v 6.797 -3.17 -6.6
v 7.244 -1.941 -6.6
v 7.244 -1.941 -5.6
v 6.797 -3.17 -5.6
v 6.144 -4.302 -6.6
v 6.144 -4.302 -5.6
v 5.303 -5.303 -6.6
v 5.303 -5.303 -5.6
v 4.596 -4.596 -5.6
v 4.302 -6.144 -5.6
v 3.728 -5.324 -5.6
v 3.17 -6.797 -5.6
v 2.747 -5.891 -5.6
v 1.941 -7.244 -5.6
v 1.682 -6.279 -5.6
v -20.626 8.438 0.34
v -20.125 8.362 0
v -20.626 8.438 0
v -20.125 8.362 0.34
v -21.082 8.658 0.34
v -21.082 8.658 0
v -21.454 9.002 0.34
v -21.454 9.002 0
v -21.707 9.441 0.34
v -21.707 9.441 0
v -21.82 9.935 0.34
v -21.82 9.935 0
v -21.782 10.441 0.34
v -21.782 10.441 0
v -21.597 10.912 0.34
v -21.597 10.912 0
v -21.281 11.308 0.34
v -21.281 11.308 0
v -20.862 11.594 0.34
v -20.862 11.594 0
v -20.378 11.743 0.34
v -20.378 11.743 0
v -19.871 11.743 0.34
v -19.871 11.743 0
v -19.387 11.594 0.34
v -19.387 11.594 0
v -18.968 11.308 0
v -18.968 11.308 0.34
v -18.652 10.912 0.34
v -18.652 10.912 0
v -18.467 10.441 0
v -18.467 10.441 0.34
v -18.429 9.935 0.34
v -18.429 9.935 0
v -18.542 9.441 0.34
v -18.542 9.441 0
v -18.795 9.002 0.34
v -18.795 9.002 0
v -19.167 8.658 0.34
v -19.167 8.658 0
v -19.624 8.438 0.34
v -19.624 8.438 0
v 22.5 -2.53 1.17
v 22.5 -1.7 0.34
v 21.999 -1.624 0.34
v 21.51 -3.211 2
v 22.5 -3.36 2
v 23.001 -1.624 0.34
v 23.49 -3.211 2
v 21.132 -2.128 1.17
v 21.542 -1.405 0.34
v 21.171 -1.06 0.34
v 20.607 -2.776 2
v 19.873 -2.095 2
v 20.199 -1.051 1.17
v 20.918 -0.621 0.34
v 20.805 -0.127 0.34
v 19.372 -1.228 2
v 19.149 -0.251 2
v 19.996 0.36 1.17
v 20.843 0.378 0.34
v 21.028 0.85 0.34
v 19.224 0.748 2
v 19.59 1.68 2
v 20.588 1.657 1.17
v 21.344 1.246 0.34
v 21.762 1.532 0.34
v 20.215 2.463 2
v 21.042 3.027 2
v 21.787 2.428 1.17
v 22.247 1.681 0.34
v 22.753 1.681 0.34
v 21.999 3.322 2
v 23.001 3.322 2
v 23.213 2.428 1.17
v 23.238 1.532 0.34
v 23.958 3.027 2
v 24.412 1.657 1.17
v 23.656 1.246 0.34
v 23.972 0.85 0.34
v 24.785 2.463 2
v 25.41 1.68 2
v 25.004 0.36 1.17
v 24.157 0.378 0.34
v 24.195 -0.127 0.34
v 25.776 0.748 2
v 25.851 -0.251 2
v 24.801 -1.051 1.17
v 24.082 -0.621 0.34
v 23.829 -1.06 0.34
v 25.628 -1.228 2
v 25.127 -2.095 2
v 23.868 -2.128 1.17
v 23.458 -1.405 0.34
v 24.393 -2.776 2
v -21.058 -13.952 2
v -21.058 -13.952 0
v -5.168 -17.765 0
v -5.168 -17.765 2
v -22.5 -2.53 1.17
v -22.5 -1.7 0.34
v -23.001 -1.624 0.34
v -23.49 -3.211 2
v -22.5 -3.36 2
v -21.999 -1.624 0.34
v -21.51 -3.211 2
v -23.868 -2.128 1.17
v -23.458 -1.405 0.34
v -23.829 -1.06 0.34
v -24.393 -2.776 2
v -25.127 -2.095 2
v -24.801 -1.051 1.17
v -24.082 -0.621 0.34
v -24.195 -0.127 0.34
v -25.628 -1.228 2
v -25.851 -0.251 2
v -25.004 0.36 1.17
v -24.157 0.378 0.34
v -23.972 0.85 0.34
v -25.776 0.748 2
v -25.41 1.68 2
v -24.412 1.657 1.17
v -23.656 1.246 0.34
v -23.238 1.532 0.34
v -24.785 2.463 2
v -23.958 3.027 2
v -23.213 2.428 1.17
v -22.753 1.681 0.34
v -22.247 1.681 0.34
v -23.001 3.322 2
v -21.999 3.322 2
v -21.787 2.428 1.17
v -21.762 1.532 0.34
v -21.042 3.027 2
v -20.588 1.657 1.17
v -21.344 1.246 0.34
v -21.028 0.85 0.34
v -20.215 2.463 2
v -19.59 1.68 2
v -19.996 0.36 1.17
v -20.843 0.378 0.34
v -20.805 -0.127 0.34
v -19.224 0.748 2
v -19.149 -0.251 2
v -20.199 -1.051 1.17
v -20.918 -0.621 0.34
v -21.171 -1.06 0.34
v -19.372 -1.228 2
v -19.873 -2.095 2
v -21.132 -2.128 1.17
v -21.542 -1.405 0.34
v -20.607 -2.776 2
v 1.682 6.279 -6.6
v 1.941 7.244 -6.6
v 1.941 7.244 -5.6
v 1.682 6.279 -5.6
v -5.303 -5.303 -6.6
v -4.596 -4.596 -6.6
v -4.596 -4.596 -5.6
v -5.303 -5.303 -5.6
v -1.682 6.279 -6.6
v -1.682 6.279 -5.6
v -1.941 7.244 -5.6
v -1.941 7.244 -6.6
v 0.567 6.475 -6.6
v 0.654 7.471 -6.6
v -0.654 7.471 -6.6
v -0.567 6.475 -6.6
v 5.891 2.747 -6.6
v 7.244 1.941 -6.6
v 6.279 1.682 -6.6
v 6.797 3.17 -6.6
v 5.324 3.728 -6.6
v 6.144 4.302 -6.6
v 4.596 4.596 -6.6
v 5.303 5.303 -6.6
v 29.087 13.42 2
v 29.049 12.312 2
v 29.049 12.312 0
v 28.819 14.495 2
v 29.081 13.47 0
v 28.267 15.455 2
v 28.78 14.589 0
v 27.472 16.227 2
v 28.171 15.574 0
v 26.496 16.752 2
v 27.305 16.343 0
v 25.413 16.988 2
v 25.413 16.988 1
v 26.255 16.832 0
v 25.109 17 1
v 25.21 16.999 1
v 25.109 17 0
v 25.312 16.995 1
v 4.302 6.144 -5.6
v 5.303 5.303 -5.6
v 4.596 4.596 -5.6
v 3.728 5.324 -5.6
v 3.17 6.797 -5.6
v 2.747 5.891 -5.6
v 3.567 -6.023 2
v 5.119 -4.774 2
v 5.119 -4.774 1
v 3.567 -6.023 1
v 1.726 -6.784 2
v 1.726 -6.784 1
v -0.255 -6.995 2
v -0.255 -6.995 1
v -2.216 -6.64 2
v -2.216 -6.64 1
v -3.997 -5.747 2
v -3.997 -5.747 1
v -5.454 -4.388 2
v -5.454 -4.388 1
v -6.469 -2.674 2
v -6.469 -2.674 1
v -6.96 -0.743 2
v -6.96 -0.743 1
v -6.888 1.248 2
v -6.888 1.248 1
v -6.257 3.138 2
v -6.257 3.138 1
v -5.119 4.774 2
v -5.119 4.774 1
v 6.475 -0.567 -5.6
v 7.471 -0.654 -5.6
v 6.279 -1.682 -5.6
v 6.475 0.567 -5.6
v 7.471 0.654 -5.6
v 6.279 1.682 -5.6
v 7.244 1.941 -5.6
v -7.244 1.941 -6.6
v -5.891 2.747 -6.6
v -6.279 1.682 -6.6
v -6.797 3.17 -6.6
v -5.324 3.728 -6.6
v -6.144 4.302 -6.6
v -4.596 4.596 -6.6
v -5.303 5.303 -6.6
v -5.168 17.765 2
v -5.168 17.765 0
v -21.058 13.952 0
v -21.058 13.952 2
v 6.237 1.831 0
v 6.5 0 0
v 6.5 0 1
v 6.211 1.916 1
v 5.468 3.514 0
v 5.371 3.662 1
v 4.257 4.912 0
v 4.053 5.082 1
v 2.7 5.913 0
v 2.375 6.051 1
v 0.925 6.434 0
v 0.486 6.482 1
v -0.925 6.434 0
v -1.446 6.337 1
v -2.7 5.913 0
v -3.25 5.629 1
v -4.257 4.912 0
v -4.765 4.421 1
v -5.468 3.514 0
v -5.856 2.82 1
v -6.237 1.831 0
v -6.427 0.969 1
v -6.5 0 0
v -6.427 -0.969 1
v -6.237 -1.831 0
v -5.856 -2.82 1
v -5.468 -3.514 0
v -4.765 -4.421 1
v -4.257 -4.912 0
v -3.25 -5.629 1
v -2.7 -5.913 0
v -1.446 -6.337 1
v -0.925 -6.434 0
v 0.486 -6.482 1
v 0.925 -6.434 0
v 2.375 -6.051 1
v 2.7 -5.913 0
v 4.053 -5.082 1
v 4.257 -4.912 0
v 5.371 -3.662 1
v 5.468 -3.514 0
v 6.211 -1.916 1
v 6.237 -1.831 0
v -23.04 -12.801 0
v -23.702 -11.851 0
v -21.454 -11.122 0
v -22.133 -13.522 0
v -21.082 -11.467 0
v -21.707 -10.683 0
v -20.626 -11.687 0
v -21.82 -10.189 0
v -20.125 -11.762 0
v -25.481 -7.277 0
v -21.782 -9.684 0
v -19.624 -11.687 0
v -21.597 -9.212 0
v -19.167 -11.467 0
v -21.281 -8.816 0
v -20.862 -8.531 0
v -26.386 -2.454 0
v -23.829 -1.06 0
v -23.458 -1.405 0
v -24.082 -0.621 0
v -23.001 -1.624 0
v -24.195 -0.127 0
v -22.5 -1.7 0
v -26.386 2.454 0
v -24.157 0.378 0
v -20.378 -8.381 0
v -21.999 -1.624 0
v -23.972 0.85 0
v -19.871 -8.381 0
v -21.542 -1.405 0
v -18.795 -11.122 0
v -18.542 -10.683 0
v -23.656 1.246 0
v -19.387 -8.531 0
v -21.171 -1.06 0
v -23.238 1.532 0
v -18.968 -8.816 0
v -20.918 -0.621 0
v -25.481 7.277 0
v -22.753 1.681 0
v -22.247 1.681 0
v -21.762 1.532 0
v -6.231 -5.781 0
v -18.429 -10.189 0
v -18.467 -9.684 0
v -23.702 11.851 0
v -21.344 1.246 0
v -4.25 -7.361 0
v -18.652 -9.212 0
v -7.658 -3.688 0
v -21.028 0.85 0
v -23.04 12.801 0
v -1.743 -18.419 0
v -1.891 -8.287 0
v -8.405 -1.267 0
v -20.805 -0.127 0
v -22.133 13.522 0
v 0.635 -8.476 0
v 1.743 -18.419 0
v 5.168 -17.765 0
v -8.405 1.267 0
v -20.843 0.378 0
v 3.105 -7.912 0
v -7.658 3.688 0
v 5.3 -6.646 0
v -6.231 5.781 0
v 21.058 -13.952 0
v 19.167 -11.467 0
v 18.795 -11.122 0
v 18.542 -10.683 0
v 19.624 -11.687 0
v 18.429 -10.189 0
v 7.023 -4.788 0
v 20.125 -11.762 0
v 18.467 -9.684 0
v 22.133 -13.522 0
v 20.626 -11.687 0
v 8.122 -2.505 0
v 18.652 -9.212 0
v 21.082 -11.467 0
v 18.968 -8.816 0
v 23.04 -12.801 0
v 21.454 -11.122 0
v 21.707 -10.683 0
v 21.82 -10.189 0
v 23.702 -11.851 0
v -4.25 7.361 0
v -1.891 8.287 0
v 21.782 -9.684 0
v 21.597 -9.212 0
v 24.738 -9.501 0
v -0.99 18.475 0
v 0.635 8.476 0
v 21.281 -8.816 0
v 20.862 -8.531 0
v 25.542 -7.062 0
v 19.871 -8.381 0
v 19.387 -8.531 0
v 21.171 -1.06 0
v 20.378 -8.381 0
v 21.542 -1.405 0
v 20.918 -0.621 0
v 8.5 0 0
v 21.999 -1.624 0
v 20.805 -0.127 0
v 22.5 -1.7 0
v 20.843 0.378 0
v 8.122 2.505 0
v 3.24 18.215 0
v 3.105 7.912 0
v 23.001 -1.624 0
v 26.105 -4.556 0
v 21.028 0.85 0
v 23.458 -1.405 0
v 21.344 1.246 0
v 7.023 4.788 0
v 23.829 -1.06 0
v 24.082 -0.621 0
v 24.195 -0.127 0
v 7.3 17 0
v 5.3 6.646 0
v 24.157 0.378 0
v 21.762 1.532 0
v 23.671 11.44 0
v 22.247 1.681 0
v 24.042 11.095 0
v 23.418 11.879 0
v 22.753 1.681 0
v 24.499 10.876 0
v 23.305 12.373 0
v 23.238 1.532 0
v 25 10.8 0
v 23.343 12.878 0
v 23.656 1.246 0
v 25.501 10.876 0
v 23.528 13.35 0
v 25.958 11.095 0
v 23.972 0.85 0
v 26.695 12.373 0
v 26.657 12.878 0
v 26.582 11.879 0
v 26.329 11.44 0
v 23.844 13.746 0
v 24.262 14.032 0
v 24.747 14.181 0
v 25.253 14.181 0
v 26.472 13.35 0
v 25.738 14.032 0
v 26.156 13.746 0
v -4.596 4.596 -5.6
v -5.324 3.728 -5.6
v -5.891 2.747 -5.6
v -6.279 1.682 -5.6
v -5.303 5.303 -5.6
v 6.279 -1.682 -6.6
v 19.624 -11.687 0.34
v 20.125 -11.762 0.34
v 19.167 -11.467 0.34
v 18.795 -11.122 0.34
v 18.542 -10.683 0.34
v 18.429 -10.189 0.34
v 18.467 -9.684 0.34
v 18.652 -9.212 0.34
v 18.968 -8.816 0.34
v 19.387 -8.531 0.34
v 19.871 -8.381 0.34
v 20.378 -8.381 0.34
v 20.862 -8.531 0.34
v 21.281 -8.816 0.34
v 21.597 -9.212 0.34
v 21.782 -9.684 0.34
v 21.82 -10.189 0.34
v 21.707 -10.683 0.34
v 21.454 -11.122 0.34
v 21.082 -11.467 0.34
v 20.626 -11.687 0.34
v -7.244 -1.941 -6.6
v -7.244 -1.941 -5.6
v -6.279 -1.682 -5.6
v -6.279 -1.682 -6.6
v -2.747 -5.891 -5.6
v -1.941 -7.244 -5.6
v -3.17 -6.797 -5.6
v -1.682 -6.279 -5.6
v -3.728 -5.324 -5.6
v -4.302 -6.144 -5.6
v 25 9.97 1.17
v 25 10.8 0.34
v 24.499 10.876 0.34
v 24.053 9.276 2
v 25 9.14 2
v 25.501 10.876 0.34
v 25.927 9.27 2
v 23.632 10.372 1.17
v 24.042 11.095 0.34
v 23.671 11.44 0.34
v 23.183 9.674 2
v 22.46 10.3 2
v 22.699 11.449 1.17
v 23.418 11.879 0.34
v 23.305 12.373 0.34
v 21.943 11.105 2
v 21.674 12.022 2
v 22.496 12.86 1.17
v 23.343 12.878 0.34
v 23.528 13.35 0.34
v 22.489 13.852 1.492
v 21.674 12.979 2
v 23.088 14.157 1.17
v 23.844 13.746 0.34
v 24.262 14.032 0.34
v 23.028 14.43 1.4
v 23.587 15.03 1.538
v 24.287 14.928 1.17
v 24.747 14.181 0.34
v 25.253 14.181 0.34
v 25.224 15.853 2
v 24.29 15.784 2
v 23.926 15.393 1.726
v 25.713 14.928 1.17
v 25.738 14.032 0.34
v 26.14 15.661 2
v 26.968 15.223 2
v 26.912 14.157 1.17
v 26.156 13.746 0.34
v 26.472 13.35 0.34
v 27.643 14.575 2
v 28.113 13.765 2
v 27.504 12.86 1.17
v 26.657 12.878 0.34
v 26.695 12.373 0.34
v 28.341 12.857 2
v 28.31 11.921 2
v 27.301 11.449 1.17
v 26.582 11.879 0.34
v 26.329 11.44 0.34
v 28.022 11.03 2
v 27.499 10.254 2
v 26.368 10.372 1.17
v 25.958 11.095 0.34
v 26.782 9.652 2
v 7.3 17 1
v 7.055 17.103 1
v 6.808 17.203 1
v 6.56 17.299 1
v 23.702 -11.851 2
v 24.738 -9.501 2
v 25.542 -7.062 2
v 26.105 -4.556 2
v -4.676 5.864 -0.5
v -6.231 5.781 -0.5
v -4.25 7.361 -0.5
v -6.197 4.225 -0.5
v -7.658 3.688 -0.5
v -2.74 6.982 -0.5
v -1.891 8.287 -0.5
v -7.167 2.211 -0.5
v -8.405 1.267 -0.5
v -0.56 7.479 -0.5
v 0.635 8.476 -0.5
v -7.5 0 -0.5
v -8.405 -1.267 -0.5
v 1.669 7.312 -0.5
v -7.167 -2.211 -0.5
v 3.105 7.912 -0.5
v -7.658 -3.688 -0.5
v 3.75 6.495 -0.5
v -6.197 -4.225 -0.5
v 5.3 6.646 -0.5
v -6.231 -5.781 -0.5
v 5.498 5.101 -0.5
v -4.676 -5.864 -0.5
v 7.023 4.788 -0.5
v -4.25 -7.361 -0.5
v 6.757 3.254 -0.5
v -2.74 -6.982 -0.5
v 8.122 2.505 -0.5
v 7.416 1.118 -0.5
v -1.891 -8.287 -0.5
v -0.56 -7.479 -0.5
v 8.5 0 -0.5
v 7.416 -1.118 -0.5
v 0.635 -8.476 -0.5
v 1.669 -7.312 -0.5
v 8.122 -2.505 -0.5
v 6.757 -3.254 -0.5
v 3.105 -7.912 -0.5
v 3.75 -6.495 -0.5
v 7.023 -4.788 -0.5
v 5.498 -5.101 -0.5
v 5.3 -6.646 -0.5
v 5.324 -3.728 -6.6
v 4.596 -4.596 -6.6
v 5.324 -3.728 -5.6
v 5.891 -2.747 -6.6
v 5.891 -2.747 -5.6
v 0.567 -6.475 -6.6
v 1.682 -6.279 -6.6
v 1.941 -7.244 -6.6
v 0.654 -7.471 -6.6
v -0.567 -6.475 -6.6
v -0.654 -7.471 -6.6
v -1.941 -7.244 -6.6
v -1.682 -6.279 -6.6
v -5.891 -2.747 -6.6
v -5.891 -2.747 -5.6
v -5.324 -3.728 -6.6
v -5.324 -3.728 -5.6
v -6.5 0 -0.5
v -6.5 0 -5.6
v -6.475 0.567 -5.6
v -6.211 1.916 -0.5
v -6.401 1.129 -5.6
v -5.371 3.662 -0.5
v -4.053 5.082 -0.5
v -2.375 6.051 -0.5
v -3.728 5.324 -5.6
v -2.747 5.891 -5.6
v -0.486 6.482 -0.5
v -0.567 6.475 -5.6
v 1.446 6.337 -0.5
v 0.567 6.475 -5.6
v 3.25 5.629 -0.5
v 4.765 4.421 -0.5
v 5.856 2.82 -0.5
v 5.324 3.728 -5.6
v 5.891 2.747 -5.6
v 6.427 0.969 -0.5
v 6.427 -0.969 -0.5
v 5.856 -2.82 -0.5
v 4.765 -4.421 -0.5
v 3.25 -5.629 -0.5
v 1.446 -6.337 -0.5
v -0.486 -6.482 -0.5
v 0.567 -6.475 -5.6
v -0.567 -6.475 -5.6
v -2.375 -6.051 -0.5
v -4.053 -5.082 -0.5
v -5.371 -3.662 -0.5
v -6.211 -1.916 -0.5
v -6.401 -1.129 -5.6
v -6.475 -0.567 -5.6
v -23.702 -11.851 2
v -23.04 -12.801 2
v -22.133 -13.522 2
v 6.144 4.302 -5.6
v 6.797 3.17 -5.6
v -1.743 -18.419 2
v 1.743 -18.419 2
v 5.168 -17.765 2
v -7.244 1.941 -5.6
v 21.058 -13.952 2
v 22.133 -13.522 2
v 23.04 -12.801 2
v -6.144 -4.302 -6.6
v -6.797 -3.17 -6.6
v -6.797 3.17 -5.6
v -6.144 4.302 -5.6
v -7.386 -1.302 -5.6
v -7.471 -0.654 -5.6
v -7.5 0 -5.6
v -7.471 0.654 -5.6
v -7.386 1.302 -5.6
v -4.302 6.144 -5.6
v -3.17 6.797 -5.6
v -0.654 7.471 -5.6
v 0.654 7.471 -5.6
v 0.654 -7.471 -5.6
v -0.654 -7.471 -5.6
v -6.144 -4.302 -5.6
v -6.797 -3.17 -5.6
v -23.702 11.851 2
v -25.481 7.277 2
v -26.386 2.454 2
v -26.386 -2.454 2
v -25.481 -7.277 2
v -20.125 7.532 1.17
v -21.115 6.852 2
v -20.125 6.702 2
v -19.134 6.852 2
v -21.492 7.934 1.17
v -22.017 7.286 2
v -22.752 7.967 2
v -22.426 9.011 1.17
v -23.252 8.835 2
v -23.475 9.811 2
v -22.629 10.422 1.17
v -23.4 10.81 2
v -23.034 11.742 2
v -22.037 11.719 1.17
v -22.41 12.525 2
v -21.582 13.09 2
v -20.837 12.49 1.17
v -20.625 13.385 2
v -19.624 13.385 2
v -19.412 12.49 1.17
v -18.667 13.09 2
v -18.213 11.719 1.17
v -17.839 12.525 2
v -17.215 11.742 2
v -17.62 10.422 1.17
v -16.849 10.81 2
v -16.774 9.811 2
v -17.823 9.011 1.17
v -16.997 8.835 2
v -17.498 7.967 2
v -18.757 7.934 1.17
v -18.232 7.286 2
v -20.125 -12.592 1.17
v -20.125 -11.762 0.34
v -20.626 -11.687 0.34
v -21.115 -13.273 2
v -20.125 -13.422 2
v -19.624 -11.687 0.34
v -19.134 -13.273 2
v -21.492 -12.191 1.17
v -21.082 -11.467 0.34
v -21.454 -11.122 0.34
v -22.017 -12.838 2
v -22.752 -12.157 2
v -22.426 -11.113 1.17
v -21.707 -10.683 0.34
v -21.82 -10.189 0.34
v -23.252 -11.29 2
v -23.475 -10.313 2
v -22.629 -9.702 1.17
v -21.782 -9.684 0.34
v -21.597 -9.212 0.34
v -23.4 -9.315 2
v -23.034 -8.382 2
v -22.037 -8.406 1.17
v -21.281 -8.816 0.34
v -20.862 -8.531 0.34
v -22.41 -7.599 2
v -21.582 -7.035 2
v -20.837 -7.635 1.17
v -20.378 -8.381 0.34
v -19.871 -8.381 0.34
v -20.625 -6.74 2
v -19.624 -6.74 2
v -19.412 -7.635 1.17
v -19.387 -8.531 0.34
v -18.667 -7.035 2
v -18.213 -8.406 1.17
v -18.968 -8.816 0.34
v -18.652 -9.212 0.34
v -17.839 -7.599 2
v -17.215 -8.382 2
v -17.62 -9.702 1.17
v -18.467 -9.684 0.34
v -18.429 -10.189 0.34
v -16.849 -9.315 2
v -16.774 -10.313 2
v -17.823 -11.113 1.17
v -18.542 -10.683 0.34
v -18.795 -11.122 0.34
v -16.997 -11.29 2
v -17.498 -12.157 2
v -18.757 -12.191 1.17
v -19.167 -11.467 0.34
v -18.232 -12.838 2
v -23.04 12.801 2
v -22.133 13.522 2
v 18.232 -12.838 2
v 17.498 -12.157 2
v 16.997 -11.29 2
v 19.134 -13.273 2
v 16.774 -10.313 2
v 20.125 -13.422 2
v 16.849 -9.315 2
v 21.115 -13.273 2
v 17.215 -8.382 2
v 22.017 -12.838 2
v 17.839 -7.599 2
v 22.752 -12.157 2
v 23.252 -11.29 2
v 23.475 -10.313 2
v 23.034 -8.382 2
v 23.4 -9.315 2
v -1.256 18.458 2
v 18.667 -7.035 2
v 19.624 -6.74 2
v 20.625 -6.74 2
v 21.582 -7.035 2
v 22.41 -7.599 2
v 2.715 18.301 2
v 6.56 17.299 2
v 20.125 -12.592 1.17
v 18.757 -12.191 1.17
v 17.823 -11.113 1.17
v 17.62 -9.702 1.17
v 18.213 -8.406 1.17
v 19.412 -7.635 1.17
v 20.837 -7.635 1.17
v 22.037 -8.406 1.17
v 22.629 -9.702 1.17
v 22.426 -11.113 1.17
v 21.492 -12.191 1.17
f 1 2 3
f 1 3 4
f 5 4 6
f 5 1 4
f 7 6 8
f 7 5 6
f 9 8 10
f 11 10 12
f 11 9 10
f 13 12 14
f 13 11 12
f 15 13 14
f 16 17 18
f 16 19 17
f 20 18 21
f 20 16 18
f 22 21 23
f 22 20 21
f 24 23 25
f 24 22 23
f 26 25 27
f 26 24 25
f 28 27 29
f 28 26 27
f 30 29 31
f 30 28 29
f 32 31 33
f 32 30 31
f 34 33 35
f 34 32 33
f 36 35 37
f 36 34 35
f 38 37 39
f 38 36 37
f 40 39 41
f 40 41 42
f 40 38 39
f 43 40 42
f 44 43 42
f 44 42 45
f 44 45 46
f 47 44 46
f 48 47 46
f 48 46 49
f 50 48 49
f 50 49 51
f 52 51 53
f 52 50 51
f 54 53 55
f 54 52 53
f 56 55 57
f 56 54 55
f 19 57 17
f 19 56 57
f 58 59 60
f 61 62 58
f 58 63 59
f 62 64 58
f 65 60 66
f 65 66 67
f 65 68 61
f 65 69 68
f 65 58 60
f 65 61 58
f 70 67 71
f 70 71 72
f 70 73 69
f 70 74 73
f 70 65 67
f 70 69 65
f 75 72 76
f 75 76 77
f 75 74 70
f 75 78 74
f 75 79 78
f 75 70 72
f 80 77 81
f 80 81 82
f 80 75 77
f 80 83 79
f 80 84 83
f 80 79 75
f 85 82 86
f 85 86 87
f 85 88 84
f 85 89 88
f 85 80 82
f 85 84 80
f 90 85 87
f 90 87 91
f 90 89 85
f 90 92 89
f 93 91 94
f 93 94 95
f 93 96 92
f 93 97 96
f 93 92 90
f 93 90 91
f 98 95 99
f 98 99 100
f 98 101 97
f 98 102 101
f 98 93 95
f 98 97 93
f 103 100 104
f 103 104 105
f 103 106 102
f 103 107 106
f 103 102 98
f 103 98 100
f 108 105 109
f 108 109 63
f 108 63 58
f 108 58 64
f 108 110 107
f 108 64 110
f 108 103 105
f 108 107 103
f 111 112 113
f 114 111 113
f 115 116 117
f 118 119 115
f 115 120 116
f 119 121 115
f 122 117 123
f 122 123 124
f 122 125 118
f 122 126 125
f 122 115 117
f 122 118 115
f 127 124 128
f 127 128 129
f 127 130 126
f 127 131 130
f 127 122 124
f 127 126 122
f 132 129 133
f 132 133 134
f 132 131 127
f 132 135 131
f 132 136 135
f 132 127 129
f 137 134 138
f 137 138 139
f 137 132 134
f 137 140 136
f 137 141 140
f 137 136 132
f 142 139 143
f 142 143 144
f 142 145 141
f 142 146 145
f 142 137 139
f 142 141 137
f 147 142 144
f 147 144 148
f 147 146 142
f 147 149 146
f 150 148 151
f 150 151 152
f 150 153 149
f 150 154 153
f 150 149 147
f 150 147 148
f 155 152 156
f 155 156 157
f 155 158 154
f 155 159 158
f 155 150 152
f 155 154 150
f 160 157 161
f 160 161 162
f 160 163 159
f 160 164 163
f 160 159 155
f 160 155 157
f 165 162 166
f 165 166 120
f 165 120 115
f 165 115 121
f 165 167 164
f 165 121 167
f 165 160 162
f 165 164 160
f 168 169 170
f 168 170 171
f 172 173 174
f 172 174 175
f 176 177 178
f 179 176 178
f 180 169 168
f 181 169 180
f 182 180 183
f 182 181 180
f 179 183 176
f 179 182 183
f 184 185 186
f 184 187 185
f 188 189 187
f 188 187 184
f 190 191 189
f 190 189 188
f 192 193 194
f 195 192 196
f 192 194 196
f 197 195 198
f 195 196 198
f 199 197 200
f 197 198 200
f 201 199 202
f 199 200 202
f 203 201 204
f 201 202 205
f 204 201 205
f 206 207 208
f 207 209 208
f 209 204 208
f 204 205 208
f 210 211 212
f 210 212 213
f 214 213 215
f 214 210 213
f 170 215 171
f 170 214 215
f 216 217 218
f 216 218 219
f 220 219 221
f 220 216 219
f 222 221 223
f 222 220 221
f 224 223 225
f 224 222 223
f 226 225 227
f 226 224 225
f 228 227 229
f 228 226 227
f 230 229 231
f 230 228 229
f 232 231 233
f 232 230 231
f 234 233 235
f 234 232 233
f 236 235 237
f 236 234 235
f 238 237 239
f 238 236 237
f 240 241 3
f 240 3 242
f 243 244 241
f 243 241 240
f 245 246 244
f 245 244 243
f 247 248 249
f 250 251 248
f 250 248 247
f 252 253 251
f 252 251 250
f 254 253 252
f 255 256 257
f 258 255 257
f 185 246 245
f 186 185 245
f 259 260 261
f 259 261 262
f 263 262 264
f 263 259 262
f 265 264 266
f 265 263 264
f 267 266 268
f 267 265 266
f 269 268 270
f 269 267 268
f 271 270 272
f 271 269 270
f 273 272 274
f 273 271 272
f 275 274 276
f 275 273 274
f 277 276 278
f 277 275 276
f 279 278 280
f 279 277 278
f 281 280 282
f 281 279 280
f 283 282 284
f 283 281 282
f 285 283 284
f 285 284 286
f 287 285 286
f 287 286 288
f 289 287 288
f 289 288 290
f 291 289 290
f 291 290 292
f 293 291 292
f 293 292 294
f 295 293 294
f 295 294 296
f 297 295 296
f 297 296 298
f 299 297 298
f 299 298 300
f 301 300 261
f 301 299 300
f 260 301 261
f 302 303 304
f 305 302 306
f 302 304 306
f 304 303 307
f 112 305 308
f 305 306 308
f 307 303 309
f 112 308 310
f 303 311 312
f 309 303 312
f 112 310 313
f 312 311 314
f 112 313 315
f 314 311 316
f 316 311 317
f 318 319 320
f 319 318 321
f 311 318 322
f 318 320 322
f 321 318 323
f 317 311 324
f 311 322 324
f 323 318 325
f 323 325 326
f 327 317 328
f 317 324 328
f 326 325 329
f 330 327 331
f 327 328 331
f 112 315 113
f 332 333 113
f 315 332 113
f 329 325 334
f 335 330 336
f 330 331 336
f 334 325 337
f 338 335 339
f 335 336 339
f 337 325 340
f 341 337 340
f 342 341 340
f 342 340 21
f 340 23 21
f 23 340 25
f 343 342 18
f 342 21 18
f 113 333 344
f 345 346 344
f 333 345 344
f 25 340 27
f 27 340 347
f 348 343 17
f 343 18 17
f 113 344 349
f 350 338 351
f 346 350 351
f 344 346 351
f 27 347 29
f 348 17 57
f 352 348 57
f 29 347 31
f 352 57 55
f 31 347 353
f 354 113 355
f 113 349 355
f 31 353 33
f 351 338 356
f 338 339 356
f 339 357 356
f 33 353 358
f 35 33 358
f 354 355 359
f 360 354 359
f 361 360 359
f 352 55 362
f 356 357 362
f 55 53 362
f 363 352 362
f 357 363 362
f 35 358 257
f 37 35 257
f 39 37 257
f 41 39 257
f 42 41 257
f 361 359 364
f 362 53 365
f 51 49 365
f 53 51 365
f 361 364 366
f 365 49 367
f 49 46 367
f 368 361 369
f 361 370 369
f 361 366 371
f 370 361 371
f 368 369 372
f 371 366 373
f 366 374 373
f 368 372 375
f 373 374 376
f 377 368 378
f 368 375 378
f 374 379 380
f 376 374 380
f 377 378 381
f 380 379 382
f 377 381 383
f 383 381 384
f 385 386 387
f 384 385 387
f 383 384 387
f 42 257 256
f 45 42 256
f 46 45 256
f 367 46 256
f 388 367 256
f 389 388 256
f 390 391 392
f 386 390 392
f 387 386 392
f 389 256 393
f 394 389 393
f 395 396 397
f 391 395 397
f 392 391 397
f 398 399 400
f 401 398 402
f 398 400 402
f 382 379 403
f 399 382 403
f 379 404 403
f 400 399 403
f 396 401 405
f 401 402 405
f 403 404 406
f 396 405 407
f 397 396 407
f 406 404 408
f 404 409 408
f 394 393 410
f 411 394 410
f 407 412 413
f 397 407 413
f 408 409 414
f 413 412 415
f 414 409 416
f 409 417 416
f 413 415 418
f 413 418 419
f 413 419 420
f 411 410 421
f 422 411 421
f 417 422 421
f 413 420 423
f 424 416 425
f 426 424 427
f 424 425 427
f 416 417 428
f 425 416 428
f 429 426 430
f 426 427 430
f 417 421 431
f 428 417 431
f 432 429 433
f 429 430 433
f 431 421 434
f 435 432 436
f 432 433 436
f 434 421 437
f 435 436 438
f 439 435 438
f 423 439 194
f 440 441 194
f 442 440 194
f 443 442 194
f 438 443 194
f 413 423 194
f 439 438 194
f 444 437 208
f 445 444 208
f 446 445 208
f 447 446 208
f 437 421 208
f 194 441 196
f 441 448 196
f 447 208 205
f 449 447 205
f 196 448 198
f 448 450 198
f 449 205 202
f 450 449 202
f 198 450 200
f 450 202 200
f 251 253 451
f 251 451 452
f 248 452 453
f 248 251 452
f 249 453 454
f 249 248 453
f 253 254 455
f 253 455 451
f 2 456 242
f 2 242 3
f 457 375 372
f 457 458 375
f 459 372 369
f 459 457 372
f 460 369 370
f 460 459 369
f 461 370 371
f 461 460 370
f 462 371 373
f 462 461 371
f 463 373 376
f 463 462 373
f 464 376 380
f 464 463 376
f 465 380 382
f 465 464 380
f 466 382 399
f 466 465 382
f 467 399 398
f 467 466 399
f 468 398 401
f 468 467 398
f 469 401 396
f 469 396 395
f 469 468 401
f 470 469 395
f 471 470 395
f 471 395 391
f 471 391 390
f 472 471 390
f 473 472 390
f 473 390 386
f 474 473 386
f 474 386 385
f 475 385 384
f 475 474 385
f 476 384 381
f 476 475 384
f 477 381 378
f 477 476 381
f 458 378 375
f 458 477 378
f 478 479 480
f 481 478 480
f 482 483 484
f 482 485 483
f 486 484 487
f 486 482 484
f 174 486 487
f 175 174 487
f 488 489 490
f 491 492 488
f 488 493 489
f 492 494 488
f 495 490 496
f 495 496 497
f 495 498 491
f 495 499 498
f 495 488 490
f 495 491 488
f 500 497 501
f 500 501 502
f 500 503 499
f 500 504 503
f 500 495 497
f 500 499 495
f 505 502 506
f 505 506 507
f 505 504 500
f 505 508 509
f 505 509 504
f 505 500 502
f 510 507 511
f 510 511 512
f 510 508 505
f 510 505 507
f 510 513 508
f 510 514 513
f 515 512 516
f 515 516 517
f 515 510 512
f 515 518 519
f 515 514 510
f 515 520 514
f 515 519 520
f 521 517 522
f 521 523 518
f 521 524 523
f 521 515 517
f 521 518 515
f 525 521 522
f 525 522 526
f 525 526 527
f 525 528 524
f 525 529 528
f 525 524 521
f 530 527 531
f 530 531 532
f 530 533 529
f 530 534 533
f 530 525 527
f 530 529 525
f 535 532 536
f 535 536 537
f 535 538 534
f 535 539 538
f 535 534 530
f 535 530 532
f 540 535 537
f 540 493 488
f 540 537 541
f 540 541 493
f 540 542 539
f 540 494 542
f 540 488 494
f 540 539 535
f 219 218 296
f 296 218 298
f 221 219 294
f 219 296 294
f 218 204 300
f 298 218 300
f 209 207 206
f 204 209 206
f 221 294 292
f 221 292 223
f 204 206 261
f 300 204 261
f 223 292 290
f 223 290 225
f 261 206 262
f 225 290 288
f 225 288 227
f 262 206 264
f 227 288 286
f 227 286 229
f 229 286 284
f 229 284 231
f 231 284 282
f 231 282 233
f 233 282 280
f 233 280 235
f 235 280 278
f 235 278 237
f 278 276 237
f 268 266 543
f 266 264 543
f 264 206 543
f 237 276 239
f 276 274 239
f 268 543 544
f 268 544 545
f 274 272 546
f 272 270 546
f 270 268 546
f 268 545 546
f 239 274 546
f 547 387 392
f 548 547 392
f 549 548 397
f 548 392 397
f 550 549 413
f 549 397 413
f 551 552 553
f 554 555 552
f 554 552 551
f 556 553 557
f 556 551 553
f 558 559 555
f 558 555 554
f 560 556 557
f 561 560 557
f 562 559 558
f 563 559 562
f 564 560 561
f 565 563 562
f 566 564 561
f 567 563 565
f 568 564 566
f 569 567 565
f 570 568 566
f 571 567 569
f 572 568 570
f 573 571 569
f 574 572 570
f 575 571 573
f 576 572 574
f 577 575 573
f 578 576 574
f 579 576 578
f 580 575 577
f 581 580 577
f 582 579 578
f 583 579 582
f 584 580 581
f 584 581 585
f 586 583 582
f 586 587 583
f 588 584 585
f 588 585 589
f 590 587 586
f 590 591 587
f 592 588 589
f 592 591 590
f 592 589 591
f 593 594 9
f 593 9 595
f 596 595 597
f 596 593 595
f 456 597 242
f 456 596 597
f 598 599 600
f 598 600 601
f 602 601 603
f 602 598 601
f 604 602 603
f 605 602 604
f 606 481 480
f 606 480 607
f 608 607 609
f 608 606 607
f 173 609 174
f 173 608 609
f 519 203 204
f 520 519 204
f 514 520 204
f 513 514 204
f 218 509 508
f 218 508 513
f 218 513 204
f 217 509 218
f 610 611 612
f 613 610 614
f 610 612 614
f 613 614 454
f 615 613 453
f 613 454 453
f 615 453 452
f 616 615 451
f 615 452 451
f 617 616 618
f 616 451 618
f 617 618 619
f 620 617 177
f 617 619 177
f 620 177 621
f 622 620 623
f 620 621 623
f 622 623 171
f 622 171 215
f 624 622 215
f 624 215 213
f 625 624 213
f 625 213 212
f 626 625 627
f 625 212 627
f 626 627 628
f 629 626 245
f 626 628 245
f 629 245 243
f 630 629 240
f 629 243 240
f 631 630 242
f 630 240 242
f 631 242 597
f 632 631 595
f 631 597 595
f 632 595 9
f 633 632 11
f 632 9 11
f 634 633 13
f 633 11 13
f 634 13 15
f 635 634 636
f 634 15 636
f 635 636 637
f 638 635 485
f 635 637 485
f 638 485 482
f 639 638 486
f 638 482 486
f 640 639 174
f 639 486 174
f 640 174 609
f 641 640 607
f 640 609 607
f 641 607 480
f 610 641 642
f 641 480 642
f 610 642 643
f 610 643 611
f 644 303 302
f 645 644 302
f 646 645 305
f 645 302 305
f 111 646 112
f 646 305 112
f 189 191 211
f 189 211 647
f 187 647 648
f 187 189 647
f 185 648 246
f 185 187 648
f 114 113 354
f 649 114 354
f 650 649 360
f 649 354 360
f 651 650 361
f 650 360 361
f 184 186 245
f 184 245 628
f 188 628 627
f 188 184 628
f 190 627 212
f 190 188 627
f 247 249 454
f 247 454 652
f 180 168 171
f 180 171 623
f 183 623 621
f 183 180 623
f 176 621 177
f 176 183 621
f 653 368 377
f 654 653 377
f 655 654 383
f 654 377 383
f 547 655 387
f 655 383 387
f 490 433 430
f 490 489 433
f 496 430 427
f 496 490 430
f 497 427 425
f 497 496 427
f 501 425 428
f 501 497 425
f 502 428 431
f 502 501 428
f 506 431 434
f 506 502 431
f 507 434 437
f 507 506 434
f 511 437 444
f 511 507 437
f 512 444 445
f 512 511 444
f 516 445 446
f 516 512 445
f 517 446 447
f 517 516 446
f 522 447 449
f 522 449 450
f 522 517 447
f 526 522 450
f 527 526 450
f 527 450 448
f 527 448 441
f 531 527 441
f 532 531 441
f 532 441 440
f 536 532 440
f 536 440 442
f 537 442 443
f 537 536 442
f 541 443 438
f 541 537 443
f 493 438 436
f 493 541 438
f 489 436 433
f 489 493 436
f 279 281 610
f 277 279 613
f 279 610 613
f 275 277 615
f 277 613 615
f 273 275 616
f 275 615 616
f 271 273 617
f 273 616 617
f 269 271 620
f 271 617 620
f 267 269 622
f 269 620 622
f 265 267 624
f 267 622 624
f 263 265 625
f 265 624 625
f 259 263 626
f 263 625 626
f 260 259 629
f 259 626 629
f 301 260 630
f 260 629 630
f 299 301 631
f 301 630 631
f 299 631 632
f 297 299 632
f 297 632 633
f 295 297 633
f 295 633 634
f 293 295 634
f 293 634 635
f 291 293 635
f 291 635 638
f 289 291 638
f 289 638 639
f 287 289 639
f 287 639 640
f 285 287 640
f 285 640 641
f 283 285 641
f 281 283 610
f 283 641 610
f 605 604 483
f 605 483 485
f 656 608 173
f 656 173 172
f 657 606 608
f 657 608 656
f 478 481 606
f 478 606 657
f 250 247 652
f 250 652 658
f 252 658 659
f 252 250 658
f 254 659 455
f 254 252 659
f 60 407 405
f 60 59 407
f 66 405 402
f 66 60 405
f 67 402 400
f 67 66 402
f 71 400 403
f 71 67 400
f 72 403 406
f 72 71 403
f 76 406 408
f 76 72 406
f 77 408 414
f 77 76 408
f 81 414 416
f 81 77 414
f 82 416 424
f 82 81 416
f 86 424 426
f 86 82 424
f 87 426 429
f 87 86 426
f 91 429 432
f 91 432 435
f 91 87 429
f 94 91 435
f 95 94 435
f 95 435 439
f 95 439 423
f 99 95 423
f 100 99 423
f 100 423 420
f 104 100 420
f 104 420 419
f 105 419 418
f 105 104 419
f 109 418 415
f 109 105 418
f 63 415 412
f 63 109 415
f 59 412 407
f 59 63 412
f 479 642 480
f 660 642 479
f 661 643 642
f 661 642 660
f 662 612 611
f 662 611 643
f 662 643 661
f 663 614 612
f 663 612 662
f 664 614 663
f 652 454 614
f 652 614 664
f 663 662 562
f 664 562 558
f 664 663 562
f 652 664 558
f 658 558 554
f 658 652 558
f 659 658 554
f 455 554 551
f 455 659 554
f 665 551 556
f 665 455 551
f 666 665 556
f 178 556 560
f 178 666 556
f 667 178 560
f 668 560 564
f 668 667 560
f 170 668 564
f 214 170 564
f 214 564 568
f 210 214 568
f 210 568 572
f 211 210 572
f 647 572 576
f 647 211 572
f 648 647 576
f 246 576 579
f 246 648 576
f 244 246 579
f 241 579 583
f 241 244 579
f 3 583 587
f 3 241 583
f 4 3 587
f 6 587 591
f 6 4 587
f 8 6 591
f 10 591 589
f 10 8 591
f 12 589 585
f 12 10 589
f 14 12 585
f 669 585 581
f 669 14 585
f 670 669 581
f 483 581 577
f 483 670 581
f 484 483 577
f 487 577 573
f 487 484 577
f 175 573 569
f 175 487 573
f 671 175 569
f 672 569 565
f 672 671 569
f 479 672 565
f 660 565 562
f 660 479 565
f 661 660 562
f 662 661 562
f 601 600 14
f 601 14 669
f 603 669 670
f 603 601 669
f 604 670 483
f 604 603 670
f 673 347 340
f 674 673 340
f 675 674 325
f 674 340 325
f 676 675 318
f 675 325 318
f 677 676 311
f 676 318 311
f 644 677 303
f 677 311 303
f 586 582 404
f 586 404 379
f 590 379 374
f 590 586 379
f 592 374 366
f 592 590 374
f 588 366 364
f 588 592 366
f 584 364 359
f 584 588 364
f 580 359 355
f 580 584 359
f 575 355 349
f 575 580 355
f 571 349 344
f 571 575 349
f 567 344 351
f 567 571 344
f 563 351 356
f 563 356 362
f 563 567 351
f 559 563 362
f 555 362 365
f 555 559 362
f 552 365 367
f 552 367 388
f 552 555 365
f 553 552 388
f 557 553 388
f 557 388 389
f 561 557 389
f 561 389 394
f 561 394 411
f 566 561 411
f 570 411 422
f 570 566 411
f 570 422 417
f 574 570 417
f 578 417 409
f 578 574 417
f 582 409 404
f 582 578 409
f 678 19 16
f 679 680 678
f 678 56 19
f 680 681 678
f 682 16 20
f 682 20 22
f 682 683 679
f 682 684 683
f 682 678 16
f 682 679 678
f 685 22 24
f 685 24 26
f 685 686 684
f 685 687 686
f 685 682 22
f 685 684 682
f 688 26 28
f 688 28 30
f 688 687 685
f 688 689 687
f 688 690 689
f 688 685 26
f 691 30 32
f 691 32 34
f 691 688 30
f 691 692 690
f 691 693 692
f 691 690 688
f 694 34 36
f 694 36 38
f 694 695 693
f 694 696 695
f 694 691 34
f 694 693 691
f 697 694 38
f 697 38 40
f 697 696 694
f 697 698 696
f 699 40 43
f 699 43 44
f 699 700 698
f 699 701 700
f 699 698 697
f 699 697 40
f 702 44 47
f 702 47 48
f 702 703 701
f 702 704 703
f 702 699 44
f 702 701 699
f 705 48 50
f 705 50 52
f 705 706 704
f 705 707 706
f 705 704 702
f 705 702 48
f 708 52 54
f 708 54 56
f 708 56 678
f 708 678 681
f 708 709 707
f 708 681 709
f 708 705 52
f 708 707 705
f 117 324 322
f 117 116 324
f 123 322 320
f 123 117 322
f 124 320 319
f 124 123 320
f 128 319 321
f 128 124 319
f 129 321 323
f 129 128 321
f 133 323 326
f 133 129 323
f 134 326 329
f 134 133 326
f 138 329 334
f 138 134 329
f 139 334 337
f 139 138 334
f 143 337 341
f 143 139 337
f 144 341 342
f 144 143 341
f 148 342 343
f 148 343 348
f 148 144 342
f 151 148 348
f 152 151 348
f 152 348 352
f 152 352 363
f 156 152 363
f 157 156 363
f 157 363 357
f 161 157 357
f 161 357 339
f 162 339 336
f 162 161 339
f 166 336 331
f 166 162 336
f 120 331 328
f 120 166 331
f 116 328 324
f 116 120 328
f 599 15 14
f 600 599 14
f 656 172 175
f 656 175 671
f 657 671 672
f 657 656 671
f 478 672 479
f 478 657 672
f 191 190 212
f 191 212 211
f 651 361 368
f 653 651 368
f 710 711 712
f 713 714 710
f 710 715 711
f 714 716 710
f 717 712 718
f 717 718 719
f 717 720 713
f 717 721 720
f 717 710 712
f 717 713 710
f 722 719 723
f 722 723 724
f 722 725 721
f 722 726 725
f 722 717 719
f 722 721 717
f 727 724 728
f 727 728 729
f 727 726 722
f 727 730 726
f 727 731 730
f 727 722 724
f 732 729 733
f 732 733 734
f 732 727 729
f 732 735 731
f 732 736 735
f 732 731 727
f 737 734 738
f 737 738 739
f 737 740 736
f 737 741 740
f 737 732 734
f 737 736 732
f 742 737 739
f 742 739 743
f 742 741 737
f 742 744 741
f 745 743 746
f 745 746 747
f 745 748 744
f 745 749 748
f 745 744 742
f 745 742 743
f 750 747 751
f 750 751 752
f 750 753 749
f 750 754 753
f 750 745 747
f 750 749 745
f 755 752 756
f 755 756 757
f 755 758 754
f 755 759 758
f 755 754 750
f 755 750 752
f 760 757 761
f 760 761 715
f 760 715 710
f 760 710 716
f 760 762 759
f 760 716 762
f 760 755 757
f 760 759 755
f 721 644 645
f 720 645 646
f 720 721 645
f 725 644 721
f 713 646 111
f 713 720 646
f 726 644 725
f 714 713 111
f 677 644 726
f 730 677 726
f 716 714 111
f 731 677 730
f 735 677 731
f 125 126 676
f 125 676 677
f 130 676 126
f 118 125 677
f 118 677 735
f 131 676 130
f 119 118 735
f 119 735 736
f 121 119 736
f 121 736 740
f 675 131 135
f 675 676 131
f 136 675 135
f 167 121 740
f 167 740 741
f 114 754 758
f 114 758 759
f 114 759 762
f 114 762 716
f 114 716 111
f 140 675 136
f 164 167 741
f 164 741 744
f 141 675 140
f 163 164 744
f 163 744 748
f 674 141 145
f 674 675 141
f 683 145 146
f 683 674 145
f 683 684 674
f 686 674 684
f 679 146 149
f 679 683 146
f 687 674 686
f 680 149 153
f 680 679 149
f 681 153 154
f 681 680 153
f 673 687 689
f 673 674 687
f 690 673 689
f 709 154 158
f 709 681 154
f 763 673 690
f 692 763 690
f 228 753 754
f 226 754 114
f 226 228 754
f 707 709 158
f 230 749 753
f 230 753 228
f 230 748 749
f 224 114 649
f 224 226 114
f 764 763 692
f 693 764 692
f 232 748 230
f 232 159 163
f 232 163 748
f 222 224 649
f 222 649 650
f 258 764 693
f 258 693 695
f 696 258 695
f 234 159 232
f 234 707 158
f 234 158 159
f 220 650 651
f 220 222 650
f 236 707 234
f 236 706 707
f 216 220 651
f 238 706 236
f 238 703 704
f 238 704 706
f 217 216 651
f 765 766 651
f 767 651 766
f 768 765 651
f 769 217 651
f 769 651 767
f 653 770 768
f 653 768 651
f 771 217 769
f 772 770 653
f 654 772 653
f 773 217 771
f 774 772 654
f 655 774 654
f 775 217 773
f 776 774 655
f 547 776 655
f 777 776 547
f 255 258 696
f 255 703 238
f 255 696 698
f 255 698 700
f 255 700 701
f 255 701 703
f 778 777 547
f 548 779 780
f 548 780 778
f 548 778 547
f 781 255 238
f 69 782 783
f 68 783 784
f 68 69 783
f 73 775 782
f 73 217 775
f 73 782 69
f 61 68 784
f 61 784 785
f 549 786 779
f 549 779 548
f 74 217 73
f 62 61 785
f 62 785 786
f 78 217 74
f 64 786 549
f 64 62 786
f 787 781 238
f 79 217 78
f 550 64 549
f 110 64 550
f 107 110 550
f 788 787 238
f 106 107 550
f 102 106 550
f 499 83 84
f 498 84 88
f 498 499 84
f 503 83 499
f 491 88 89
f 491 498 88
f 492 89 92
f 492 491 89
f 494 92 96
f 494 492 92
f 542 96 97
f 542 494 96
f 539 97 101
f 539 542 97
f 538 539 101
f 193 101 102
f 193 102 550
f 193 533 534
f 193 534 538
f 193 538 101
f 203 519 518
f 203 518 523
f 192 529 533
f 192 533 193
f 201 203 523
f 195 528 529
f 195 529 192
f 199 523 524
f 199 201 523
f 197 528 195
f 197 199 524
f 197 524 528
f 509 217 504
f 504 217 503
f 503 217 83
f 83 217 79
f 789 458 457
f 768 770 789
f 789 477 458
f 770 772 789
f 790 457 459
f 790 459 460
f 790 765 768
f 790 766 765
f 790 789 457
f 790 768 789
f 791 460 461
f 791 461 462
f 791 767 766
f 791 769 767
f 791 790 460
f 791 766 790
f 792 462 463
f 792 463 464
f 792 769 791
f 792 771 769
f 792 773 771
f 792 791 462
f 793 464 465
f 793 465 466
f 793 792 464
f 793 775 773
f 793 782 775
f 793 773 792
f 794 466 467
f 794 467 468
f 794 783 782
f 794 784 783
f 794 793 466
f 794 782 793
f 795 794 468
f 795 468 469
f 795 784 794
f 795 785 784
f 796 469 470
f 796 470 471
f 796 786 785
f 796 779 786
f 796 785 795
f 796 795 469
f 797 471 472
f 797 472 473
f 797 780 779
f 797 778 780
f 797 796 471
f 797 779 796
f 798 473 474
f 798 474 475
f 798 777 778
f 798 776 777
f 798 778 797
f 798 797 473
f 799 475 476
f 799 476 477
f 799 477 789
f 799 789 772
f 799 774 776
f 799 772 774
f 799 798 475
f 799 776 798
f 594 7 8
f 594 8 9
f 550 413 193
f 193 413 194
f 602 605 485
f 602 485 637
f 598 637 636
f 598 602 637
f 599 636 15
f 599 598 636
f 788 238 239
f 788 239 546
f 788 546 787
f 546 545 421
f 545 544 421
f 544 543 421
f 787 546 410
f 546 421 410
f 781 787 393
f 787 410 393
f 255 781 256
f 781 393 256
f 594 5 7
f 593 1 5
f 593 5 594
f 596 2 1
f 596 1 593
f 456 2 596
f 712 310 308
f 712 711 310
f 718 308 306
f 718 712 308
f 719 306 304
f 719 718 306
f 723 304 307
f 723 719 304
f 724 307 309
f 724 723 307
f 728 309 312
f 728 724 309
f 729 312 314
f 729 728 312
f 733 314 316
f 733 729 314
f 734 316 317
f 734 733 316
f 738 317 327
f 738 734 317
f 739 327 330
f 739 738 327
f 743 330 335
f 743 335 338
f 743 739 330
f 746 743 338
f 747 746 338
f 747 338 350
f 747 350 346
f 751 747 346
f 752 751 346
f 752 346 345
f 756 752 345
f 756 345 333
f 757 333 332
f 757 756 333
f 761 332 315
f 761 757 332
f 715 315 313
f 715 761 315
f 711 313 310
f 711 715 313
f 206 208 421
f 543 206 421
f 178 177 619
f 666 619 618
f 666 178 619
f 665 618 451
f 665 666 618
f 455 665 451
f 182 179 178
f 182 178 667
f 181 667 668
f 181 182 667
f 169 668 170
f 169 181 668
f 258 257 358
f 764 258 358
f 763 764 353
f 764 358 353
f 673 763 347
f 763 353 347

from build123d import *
from build123d.topology import SkipClean

# Parameters (mm, degrees)
SKETCH_1_R                 = 0.5
SKETCH_1_R_2               = 6.5
EXTRUDE_2_DEPTH            = 2
HOLE_WIZARD_M31_AT_2_COUNT = 2
HOLE_WIZARD_M31_AT_2_PITCH = 10.338881425
HOLE_WIZARD_M31_AT_3_COUNT = 2
HOLE_WIZARD_M31_AT_3_PITCH = 20.124611797
HOLE_WIZARD_M31_AT_4_COUNT = 2
HOLE_WIZARD_M31_AT_4_PITCH = 45
HOLE_WIZARD_M31_AT_5_COUNT = 2
HOLE_WIZARD_M31_AT_5_PITCH = 43.796204526
HOLE_WIZARD_M31_AT_6_COUNT = 2
HOLE_WIZARD_M31_AT_6_PITCH = 45.190407637
EXTRUDE_START              = 0.5
SKETCH_4_R                 = 8.5
SKETCH_4_R_2               = 6.5
EXTRUDE_3_DEPTH            = 0.5
EXTRUDE_START_2            = 5.1
SKETCH_5_R                 = 7.5
SKETCH_5_R_2               = 6.5
EXTRUDE_4_DEPTH            = 5.1
CUT_EXTRUDE_1_DEPTH        = 1
EXTRUDE_START_3            = 1
EXTRUDE_5_DEPTH            = 1


with BuildPart() as part:
    # Эскиз1 → Бобышка-Вытянуть2 (new body)
    with BuildSketch(Plane.XY):
        with BuildLine():
            Line((-5.16821295, 17.764543293), (-21.057898637, 13.951904294))
            ThreePointArc((-21.057898637, 13.951904294), (-22.612693727, 13.19430978), (-23.702320561, 11.851160281))
            ThreePointArc((-23.702320561, 11.851160281), (-26.5, 0), (-23.702320561, -11.851160281))
            ThreePointArc((-23.702320561, -11.851160281), (-22.612693727, -13.19430978), (-21.057898637, -13.951904294))
            Line((-21.057898637, -13.951904294), (-5.16821295, -17.764543293))
            ThreePointArc((-5.16821295, -17.764543293), (0, -18.50106547), (5.16821295, -17.764543293))
            Line((5.16821295, -17.764543293), (21.057898637, -13.951904294))
            ThreePointArc((21.057898637, -13.951904294), (22.612693727, -13.19430978), (23.702320561, -11.851160281))
            ThreePointArc((23.702320561, -11.851160281), (25.169556704, -8.291164895), (26.105397143, -4.556121157))
            Line((26.105397143, -4.556121157), (29.049405058, 12.312283599))
            ThreePointArc((29.049405058, 12.312283599), (28.170900607, 15.573823459), (25.108967753, 17))
            Line((25.108967753, 17), (7.299960514, 17))
            ThreePointArc((7.299960514, 17), (1.132350887, 18.466380397), (-5.16821295, 17.764543293))
        make_face()
        with Locations((25, 12.5)):
            Circle(SKETCH_1_R, mode=Mode.SUBTRACT)
        with Locations((22.5, 0)):
            Circle(SKETCH_1_R, mode=Mode.SUBTRACT)
        with Locations((20.124611797, -10.062305899)):
            Circle(SKETCH_1_R, mode=Mode.SUBTRACT)
        with Locations(Location((-20.124611797, -10.062305899, 0), (0, 0, 180))):
            Circle(SKETCH_1_R, mode=Mode.SUBTRACT)
        with Locations(Location((-22.5, 0, 0), (0, 0, 180))):
            Circle(SKETCH_1_R, mode=Mode.SUBTRACT)
        with Locations((-20.124611797, 10.062305899)):
            Circle(SKETCH_1_R, mode=Mode.SUBTRACT)
        Circle(SKETCH_1_R_2, mode=Mode.SUBTRACT)
    extrude(amount=EXTRUDE_2_DEPTH)

    # Эскиз3 → Зенковка для винта с потайной головкой и внутренним шестигранником M31 (revolve, cut)
    with BuildSketch(Plane(origin=(-20.124611797, 10.062305899, 2), x_dir=(0, -1, 0), z_dir=(1, 0, 0))):
        Polygon((0, 0), (0, 2), (1.7, 2), (1.7, 1.66), (3.36, 0), align=None)
    hole_wizard_m31 = revolve(axis=Axis((-20.124611797, 10.062305899, 8.35), (0, 0, -1)), mode=Mode.SUBTRACT)

    # Зенковка для винта с потайной головкой и внутренним шестигранником M31 at 2: Зенковка для винта с потайной головкой и внутренним шестигранником M31 ×2
    with Locations(*[Vector(-0.2297529205473615, -0.9732489894677301, 0) * (i * HOLE_WIZARD_M31_AT_2_PITCH) for i in range(1, HOLE_WIZARD_M31_AT_2_COUNT)]):
        add(hole_wizard_m31, mode=Mode.SUBTRACT)

    # Зенковка для винта с потайной головкой и внутренним шестигранником M31 at 3: Зенковка для винта с потайной головкой и внутренним шестигранником M31 ×2
    with Locations(*[(0, -i * HOLE_WIZARD_M31_AT_3_PITCH, 0) for i in range(1, HOLE_WIZARD_M31_AT_3_COUNT)]):
        add(hole_wizard_m31, mode=Mode.SUBTRACT)

    # Зенковка для винта с потайной головкой и внутренним шестигранником M31 at 4: Зенковка для винта с потайной головкой и внутренним шестигранником M31 ×2
    with Locations(*[Vector(0.894427190999916, -0.4472135954999578, 0) * (i * HOLE_WIZARD_M31_AT_4_PITCH) for i in range(1, HOLE_WIZARD_M31_AT_4_COUNT)]):
        add(hole_wizard_m31, mode=Mode.SUBTRACT)

    # Зенковка для винта с потайной головкой и внутренним шестигранником M31 at 5: Зенковка для винта с потайной головкой и внутренним шестигранником M31 ×2
    with Locations(*[Vector(0.9732489894677302, -0.2297529205473611, 0) * (i * HOLE_WIZARD_M31_AT_5_PITCH) for i in range(1, HOLE_WIZARD_M31_AT_5_COUNT)]):
        add(hole_wizard_m31, mode=Mode.SUBTRACT)

    # Зенковка для винта с потайной головкой и внутренним шестигранником M31 at 6: Зенковка для винта с потайной головкой и внутренним шестигранником M31 ×2
    with Locations(*[Vector(0.9985440308456991, 0.0539427331753181, 0) * (i * HOLE_WIZARD_M31_AT_6_PITCH) for i in range(1, HOLE_WIZARD_M31_AT_6_COUNT)]):
        add(hole_wizard_m31, mode=Mode.SUBTRACT)

    # Эскиз4 → Бобышка-Вытянуть3 (add)
    with SkipClean():  # the faces are left unmerged after this step: merging them gives an invalid solid
        with BuildSketch(Plane(origin=(0, 0, 0), x_dir=(-1, 0, 0), z_dir=(0, 0, -1)).offset(EXTRUDE_START)):
            with Locations(Location((0, 0, 0), (0, 0, 180))):
                Circle(SKETCH_4_R)
            Circle(SKETCH_4_R_2, mode=Mode.SUBTRACT)
        extrude(amount=-EXTRUDE_3_DEPTH)

    # Эскиз5 → Бобышка-Вытянуть4 (add)
    with SkipClean():  # the faces are left unmerged after this step: merging them gives an invalid solid
        with BuildSketch(Plane(origin=(0, 0, -0.5), x_dir=(-1, 0, 0), z_dir=(0, 0, -1)).offset(EXTRUDE_START_2)):
            Circle(SKETCH_5_R)
            Circle(SKETCH_5_R_2, mode=Mode.SUBTRACT)
        extrude(amount=-EXTRUDE_4_DEPTH)

    # Эскиз6 → Вырез-Вытянуть1 (cut)
    with SkipClean():  # the faces are left unmerged after this step: merging them gives an invalid solid
        with BuildSketch(Plane.XY.offset(2)):
            with BuildLine():
                Line((-5.119475911, 4.77398852), (15.340474891, 26.714599569))
                Line((15.340474891, 26.714599569), (25.579426713, 17.166622528))
                Line((25.579426713, 17.166622528), (5.119475911, -4.77398852))
                ThreePointArc((5.119475911, -4.77398852), (-4.77398852, -5.119475911), (-5.119475911, 4.77398852))
            make_face()
        extrude(amount=-CUT_EXTRUDE_1_DEPTH, mode=Mode.SUBTRACT)

    # Эскиз7 → Бобышка-Вытянуть5 (add)
    with SkipClean():  # the faces are left unmerged after this step: merging them gives an invalid solid
        with BuildSketch(Plane(origin=(0, 0, -5.6), x_dir=(-1, 0, 0), z_dir=(0, 0, -1)).offset(EXTRUDE_START_3)):
            with BuildLine():
                Line((-1.941142838, 7.244443697), (-1.682323793, 6.278517871))
                ThreePointArc((-1.682323793, 6.278517871), (0, 6.5), (1.682323793, 6.278517871))
                Line((1.682323793, 6.278517871), (1.941142838, 7.244443697))
                ThreePointArc((1.941142838, 7.244443697), (0, 7.5), (-1.941142838, 7.244443697))
            make_face()
            with BuildLine():
                Line((5.303300859, 5.303300859), (4.596194078, 4.596194078))
                ThreePointArc((4.596194078, 4.596194078), (5.629165125, 3.25), (6.278517871, 1.682323793))
                Line((6.278517871, 1.682323793), (7.244443697, 1.941142838))
                ThreePointArc((7.244443697, 1.941142838), (6.495190528, 3.75), (5.303300859, 5.303300859))
            make_face()
            with BuildLine():
                Line((7.244443697, -1.941142838), (6.278517871, -1.682323793))
                ThreePointArc((6.278517871, -1.682323793), (5.629165125, -3.25), (4.596194078, -4.596194078))
                Line((4.596194078, -4.596194078), (5.303300859, -5.303300859))
                ThreePointArc((5.303300859, -5.303300859), (6.495190528, -3.75), (7.244443697, -1.941142838))
            make_face()
            with BuildLine():
                Line((1.941142838, -7.244443697), (1.682323793, -6.278517871))
                ThreePointArc((1.682323793, -6.278517871), (0, -6.5), (-1.682323793, -6.278517871))
                Line((-1.682323793, -6.278517871), (-1.941142838, -7.244443697))
                ThreePointArc((-1.941142838, -7.244443697), (0, -7.5), (1.941142838, -7.244443697))
            make_face()
            with BuildLine():
                Line((-5.303300859, -5.303300859), (-4.596194078, -4.596194078))
                ThreePointArc((-4.596194078, -4.596194078), (-5.629165125, -3.25), (-6.278517871, -1.682323793))
                Line((-6.278517871, -1.682323793), (-7.244443697, -1.941142838))
                ThreePointArc((-7.244443697, -1.941142838), (-6.495190528, -3.75), (-5.303300859, -5.303300859))
            make_face()
            with BuildLine():
                Line((-7.244443697, 1.941142838), (-6.278517871, 1.682323793))
                ThreePointArc((-6.278517871, 1.682323793), (-5.629165125, 3.25), (-4.596194078, 4.596194078))
                Line((-4.596194078, 4.596194078), (-5.303300859, 5.303300859))
                ThreePointArc((-5.303300859, 5.303300859), (-6.495190528, 3.75), (-7.244443697, 1.941142838))
            make_face()
        extrude(amount=-EXTRUDE_5_DEPTH)


solid = part.part
